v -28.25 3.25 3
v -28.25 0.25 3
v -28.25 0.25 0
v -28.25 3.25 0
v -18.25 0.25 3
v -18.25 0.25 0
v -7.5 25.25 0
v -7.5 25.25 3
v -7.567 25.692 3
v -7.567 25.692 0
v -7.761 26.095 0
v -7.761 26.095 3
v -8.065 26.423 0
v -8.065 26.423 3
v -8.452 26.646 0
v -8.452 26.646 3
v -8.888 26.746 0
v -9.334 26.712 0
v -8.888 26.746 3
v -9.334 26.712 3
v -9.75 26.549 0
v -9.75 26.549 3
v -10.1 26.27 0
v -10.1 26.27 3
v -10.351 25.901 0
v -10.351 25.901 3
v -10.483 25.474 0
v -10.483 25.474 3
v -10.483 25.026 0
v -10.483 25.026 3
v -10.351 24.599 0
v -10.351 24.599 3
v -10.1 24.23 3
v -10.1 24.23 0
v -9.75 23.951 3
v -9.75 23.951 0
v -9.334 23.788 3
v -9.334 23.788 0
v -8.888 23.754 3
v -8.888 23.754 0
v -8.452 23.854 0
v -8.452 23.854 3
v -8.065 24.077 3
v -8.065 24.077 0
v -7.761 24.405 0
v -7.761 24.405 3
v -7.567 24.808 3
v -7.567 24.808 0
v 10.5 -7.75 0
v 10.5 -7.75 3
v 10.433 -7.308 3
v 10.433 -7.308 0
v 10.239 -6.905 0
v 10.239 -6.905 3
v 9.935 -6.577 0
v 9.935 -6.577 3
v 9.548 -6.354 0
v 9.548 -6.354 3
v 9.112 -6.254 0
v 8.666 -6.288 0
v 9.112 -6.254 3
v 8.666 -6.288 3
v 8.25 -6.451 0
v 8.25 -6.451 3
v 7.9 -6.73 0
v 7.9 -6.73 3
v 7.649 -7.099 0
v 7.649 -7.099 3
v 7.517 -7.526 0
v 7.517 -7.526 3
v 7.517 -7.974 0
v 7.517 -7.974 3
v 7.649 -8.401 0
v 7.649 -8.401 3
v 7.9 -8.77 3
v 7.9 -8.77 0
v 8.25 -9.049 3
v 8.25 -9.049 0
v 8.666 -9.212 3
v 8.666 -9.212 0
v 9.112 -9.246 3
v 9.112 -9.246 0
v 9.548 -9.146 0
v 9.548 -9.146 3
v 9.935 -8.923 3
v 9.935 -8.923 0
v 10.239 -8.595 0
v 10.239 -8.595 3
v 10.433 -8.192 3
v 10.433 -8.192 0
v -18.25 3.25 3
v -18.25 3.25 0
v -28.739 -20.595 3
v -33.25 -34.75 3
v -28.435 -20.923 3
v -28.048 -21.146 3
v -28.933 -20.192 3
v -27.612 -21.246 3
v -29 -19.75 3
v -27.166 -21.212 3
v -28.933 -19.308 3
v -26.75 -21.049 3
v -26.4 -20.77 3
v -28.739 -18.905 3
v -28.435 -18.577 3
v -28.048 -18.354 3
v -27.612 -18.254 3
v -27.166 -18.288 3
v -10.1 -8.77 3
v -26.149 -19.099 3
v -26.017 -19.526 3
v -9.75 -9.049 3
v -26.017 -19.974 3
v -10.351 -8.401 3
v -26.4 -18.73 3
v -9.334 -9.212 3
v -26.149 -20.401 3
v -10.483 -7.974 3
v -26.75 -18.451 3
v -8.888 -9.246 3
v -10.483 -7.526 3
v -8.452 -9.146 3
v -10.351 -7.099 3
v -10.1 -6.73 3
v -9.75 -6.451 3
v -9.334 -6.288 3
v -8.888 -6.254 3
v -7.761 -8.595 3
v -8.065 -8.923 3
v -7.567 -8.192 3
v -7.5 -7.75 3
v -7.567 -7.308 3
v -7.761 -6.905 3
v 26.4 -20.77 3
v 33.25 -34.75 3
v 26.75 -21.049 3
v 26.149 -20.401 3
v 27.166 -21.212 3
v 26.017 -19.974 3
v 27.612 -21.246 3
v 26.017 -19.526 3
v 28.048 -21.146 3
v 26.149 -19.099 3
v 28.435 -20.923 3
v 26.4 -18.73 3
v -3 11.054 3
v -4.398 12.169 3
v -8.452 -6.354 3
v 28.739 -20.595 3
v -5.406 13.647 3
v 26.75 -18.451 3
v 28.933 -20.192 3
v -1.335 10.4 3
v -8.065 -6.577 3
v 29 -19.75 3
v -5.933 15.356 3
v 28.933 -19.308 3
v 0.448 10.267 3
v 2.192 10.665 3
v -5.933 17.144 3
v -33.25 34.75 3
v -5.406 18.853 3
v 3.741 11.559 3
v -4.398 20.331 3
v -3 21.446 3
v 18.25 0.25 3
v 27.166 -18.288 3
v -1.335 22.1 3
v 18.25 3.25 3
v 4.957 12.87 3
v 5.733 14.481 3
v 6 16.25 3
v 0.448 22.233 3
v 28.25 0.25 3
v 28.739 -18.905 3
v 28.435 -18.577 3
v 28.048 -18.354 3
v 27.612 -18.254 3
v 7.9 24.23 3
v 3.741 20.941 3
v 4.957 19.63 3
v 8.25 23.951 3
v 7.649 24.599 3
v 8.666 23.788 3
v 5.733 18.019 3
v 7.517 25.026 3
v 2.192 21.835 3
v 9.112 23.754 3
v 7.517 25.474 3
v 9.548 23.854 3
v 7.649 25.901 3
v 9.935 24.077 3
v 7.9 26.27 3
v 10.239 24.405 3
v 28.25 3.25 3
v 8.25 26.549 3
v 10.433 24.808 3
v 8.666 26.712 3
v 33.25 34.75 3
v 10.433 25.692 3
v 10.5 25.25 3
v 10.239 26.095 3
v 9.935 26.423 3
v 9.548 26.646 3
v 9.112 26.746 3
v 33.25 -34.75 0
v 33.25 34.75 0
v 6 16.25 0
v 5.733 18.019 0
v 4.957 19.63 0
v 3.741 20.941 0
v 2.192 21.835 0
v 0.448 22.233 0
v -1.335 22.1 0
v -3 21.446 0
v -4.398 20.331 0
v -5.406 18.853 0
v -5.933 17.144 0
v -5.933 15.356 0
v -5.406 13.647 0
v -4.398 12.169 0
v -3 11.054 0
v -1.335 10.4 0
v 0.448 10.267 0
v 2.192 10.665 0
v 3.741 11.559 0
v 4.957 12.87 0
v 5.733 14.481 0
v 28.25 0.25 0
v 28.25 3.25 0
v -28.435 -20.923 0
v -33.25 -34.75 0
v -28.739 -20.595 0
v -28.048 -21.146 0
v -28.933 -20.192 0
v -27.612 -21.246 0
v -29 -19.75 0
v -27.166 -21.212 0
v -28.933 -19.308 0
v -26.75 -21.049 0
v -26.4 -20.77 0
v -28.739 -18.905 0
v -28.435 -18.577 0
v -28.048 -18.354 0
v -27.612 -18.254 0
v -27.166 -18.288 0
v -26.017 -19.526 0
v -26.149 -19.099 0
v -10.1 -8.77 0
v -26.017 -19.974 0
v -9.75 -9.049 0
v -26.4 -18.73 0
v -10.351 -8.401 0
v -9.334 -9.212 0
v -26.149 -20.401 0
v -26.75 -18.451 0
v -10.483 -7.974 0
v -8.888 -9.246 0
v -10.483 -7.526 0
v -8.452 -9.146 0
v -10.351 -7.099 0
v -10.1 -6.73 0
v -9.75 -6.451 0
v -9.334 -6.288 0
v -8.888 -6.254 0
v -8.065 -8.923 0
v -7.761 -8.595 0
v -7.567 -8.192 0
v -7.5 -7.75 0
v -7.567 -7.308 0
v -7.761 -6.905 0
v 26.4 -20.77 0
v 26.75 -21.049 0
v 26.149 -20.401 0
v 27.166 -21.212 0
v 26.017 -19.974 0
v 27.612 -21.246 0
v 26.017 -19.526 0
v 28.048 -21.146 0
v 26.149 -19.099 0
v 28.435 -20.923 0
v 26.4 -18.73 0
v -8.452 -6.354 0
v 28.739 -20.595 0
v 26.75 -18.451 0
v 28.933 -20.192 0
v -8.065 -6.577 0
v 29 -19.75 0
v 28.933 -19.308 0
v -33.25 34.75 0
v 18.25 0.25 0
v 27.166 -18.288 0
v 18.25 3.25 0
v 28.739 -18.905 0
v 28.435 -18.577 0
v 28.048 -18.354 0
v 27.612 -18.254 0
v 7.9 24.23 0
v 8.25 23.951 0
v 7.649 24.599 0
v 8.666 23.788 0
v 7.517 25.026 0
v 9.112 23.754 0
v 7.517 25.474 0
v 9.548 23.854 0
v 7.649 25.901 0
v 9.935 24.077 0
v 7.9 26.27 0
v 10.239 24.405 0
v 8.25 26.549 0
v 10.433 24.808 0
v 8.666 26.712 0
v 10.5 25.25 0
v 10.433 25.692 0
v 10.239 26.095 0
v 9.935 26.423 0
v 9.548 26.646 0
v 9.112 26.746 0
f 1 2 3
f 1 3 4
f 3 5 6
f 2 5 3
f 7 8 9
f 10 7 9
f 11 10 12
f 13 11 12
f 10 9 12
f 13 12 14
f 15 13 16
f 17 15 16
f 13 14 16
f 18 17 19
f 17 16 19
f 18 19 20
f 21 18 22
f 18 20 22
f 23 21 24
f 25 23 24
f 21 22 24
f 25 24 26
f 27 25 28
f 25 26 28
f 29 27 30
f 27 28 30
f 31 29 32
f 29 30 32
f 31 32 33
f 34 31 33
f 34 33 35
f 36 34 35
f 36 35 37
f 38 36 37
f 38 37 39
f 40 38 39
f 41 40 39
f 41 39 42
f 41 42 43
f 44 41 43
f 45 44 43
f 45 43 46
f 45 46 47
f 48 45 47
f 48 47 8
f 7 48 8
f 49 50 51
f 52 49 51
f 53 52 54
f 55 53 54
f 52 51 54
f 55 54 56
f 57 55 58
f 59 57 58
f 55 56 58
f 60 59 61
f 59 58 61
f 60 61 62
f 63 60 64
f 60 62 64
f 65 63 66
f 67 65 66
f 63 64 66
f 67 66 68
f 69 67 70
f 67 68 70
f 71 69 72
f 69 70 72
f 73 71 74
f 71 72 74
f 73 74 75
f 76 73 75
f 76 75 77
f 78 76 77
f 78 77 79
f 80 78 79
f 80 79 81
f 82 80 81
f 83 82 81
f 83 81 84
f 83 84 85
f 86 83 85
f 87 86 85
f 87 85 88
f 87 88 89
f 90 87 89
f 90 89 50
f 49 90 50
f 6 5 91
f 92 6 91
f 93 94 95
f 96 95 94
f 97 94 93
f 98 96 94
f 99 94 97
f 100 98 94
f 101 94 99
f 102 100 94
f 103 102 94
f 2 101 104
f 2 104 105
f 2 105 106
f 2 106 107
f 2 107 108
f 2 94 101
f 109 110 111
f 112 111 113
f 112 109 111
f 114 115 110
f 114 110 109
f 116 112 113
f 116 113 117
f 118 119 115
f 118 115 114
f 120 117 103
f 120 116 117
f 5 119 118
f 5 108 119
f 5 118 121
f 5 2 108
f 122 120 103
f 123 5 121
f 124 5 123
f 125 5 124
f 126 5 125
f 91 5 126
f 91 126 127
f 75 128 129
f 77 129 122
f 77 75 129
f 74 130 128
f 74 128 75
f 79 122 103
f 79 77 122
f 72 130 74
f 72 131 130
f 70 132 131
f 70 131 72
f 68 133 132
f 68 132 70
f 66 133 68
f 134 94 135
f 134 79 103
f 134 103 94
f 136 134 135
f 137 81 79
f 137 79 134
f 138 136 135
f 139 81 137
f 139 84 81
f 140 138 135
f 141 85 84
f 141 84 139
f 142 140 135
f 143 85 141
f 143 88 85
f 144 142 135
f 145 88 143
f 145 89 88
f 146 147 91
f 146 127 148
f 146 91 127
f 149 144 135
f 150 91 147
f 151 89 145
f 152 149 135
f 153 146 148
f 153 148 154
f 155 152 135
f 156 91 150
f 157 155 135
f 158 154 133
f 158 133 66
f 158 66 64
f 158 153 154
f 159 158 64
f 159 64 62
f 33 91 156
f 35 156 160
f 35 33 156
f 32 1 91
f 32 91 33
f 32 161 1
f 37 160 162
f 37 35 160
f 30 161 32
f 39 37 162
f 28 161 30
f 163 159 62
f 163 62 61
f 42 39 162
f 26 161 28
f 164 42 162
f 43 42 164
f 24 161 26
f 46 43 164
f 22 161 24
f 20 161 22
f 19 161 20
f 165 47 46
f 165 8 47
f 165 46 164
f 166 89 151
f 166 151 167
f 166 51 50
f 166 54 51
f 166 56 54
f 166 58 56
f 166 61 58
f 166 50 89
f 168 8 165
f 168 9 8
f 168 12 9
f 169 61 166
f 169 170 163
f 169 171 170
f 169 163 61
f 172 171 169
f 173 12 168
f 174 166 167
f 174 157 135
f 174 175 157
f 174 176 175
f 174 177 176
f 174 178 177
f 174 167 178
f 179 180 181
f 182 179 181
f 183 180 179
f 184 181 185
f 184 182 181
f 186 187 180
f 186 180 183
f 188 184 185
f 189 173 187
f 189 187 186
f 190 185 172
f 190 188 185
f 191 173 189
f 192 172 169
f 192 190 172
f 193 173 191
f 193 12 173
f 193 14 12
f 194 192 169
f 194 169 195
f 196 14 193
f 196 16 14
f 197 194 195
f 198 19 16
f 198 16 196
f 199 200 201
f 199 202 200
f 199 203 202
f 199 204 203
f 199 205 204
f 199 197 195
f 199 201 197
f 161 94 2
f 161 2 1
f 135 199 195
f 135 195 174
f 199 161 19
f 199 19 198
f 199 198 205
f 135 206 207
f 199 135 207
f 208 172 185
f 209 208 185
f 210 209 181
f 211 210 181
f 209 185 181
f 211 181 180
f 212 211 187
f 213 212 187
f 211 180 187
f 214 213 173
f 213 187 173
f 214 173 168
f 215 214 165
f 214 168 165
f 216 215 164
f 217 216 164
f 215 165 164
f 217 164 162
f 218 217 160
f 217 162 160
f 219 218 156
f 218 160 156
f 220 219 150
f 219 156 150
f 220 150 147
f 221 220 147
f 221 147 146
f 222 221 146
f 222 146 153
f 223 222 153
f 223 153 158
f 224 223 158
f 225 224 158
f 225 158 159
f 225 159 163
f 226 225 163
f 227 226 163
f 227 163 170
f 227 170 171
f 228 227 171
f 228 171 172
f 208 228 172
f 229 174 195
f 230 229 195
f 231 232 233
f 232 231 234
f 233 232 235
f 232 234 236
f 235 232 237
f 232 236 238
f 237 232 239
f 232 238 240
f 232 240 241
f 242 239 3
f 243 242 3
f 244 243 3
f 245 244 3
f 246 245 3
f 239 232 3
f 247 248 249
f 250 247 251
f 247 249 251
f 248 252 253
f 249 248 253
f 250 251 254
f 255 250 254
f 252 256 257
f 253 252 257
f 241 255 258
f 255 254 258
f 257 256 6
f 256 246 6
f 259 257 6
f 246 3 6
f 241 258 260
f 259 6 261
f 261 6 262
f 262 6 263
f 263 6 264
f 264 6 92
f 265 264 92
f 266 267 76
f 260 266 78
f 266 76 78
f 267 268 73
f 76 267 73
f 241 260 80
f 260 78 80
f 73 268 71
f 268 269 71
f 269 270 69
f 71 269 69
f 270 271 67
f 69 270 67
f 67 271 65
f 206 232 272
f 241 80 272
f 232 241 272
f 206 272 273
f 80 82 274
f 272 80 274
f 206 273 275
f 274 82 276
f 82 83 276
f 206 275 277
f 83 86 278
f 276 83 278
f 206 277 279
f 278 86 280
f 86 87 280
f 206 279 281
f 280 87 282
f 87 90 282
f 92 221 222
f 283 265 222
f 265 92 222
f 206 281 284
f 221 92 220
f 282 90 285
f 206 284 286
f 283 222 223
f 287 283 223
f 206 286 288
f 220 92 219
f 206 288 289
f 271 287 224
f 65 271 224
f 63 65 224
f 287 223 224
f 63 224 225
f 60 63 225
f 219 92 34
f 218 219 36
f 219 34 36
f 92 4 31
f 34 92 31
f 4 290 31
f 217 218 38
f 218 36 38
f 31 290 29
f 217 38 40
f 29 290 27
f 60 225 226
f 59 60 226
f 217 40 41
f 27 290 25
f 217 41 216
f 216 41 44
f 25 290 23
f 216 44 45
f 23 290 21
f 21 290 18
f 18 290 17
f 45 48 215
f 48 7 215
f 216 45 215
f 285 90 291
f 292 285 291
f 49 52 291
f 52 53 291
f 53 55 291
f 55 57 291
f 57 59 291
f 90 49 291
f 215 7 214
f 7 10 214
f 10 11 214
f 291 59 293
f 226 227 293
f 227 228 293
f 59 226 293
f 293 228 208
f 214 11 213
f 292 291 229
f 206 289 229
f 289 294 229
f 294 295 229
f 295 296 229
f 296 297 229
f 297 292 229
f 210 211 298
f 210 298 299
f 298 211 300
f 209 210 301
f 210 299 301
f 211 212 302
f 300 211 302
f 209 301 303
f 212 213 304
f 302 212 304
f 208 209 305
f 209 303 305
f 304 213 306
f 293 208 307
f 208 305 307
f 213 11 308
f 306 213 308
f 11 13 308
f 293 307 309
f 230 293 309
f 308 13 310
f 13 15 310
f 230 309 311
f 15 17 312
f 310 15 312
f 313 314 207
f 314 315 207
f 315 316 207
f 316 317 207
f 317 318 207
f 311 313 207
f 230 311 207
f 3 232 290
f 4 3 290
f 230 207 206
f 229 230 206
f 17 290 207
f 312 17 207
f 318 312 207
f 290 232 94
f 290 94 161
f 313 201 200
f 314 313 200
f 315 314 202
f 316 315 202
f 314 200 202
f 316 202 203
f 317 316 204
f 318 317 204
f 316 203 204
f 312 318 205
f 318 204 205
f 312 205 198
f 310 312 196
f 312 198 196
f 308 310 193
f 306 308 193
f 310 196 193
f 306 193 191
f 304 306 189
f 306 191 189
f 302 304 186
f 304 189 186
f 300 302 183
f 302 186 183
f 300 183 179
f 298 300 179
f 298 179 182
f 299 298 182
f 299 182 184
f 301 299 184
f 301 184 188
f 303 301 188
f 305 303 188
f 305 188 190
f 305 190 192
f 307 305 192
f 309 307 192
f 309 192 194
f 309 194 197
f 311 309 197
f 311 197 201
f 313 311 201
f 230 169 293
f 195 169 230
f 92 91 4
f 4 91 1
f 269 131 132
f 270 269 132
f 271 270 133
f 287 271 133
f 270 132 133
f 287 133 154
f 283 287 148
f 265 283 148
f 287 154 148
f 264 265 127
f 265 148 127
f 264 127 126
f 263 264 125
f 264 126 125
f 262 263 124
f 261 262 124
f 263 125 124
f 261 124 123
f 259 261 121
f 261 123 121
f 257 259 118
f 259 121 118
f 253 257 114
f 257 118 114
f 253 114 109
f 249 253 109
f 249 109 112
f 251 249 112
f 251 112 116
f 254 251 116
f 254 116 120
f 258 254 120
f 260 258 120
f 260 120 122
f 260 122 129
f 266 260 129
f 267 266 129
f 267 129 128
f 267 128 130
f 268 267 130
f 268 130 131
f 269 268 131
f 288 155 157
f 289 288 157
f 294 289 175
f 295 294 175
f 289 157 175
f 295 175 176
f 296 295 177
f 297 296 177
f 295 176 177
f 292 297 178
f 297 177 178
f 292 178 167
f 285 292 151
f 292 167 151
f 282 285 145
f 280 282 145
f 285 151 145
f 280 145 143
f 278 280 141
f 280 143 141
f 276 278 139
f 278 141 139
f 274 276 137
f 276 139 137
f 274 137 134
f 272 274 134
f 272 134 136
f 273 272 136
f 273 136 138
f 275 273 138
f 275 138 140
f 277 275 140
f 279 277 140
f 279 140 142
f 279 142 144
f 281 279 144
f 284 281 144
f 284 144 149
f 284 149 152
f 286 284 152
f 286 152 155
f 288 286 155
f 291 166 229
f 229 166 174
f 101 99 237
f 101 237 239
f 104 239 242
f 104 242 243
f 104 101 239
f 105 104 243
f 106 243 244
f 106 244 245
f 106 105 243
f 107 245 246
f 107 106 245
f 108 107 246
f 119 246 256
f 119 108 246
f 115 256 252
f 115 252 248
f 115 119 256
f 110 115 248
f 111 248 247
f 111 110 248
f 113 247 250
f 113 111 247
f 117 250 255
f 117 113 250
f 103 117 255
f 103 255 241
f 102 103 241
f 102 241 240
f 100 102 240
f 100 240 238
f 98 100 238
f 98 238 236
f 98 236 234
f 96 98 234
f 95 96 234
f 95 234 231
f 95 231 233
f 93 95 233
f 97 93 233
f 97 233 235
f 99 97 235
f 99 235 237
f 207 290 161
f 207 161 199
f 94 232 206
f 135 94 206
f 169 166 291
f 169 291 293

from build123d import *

# Parameters (mm, degrees)
SKETCH1_W           = 66.5
SKETCH1_H           = 69.5
BOSS_EXTRUDE1_DEPTH = 3
CUT_EXTRUDE1_REACH  = 50.188
SKETCH3_R           = 6
SKETCH3_R_2         = 1.5
CUT_EXTRUDE2_REACH  = 50.188
SKETCH4_R           = 1.5
CUT_EXTRUDE3_REACH  = 50.188
SKETCH5_W           = 10
SKETCH5_H           = 3


with BuildPart() as part:
    # Sketch1 → Boss-Extrude1 (new body)
    with BuildSketch(Plane.XY):
        Rectangle(SKETCH1_W, SKETCH1_H)
    extrude(amount=BOSS_EXTRUDE1_DEPTH)

    # Sketch3 → Cut-Extrude1 (cut, up to next)
    with BuildSketch(Plane.XY.offset(3), mode=Mode.PRIVATE) as cut_extrude1_sk1:
        with Locations((0, 16.25)):
            Circle(SKETCH3_R)
    cut_extrude1_tool1 = extrude(cut_extrude1_sk1.sketch, amount=-CUT_EXTRUDE1_REACH, mode=Mode.PRIVATE) & part.part
    # Sketch3 → Cut-Extrude1 (cut, up to next)
    with BuildSketch(Plane.XY.offset(3), mode=Mode.PRIVATE) as cut_extrude1_sk2:
        with Locations((9, 25.25)):
            Circle(SKETCH3_R_2)
    cut_extrude1_tool2 = extrude(cut_extrude1_sk2.sketch, amount=-CUT_EXTRUDE1_REACH, mode=Mode.PRIVATE) & part.part
    # Sketch3 → Cut-Extrude1 (cut, up to next)
    with BuildSketch(Plane.XY.offset(3), mode=Mode.PRIVATE) as cut_extrude1_sk3:
        with Locations((-9, 25.25)):
            Circle(SKETCH3_R_2)
    cut_extrude1_tool3 = extrude(cut_extrude1_sk3.sketch, amount=-CUT_EXTRUDE1_REACH, mode=Mode.PRIVATE) & part.part
    # Sketch3 → Cut-Extrude1 (cut, up to next)
    with BuildSketch(Plane.XY.offset(3), mode=Mode.PRIVATE) as cut_extrude1_sk4:
        with Locations((9, -7.75)):
            Circle(SKETCH3_R_2)
    cut_extrude1_tool4 = extrude(cut_extrude1_sk4.sketch, amount=-CUT_EXTRUDE1_REACH, mode=Mode.PRIVATE) & part.part
    # Sketch3 → Cut-Extrude1 (cut, up to next)
    with BuildSketch(Plane.XY.offset(3), mode=Mode.PRIVATE) as cut_extrude1_sk5:
        with Locations((-9, -7.75)):
            Circle(SKETCH3_R_2)
    cut_extrude1_tool5 = extrude(cut_extrude1_sk5.sketch, amount=-CUT_EXTRUDE1_REACH, mode=Mode.PRIVATE) & part.part
    add(cut_extrude1_tool1.solids().sort_by_distance((0, 16.25, 3))[0], mode=Mode.SUBTRACT)
    add(cut_extrude1_tool2.solids().sort_by_distance((9, 25.25, 3))[0], mode=Mode.SUBTRACT)
    add(cut_extrude1_tool3.solids().sort_by_distance((-9, 25.25, 3))[0], mode=Mode.SUBTRACT)
    add(cut_extrude1_tool4.solids().sort_by_distance((9, -7.75, 3))[0], mode=Mode.SUBTRACT)
    add(cut_extrude1_tool5.solids().sort_by_distance((-9, -7.75, 3))[0], mode=Mode.SUBTRACT)

    # Sketch4 → Cut-Extrude2 (cut, up to next)
    with BuildSketch(Plane.XY.offset(3), mode=Mode.PRIVATE) as cut_extrude2_sk1:
        with Locations((27.5, -19.75)):
            Circle(SKETCH4_R)
    cut_extrude2_tool1 = extrude(cut_extrude2_sk1.sketch, amount=-CUT_EXTRUDE2_REACH, mode=Mode.PRIVATE) & part.part
    cut_extrude2 = cut_extrude2_tool1.solids().sort_by_distance((27.5, -19.75, 3))[0]
    add(cut_extrude2, mode=Mode.SUBTRACT)

    # Mirror1: Cut-Extrude2 across plane
    add(cut_extrude2.mirror(Plane(origin=(0, 0, 0), x_dir=(0, 0, 1), z_dir=(1, 0, 0))), mode=Mode.SUBTRACT)

    # Sketch5 → Cut-Extrude3 (cut, up to next)
    with BuildSketch(Plane.XY.offset(3), mode=Mode.PRIVATE) as cut_extrude3_sk1:
        with Locations((23.25, 1.75)):
            Rectangle(SKETCH5_W, SKETCH5_H)
    cut_extrude3_tool1 = extrude(cut_extrude3_sk1.sketch, amount=-CUT_EXTRUDE3_REACH, mode=Mode.PRIVATE) & part.part
    cut_extrude3 = cut_extrude3_tool1.solids().sort_by_distance((23.25, 1.75, 3))[0]
    add(cut_extrude3, mode=Mode.SUBTRACT)

    # Mirror2: Cut-Extrude3 across plane
    add(cut_extrude3.mirror(Plane(origin=(0, 0, 0), x_dir=(0, 0, 1), z_dir=(1, 0, 0))), mode=Mode.SUBTRACT)


solid = part.part
